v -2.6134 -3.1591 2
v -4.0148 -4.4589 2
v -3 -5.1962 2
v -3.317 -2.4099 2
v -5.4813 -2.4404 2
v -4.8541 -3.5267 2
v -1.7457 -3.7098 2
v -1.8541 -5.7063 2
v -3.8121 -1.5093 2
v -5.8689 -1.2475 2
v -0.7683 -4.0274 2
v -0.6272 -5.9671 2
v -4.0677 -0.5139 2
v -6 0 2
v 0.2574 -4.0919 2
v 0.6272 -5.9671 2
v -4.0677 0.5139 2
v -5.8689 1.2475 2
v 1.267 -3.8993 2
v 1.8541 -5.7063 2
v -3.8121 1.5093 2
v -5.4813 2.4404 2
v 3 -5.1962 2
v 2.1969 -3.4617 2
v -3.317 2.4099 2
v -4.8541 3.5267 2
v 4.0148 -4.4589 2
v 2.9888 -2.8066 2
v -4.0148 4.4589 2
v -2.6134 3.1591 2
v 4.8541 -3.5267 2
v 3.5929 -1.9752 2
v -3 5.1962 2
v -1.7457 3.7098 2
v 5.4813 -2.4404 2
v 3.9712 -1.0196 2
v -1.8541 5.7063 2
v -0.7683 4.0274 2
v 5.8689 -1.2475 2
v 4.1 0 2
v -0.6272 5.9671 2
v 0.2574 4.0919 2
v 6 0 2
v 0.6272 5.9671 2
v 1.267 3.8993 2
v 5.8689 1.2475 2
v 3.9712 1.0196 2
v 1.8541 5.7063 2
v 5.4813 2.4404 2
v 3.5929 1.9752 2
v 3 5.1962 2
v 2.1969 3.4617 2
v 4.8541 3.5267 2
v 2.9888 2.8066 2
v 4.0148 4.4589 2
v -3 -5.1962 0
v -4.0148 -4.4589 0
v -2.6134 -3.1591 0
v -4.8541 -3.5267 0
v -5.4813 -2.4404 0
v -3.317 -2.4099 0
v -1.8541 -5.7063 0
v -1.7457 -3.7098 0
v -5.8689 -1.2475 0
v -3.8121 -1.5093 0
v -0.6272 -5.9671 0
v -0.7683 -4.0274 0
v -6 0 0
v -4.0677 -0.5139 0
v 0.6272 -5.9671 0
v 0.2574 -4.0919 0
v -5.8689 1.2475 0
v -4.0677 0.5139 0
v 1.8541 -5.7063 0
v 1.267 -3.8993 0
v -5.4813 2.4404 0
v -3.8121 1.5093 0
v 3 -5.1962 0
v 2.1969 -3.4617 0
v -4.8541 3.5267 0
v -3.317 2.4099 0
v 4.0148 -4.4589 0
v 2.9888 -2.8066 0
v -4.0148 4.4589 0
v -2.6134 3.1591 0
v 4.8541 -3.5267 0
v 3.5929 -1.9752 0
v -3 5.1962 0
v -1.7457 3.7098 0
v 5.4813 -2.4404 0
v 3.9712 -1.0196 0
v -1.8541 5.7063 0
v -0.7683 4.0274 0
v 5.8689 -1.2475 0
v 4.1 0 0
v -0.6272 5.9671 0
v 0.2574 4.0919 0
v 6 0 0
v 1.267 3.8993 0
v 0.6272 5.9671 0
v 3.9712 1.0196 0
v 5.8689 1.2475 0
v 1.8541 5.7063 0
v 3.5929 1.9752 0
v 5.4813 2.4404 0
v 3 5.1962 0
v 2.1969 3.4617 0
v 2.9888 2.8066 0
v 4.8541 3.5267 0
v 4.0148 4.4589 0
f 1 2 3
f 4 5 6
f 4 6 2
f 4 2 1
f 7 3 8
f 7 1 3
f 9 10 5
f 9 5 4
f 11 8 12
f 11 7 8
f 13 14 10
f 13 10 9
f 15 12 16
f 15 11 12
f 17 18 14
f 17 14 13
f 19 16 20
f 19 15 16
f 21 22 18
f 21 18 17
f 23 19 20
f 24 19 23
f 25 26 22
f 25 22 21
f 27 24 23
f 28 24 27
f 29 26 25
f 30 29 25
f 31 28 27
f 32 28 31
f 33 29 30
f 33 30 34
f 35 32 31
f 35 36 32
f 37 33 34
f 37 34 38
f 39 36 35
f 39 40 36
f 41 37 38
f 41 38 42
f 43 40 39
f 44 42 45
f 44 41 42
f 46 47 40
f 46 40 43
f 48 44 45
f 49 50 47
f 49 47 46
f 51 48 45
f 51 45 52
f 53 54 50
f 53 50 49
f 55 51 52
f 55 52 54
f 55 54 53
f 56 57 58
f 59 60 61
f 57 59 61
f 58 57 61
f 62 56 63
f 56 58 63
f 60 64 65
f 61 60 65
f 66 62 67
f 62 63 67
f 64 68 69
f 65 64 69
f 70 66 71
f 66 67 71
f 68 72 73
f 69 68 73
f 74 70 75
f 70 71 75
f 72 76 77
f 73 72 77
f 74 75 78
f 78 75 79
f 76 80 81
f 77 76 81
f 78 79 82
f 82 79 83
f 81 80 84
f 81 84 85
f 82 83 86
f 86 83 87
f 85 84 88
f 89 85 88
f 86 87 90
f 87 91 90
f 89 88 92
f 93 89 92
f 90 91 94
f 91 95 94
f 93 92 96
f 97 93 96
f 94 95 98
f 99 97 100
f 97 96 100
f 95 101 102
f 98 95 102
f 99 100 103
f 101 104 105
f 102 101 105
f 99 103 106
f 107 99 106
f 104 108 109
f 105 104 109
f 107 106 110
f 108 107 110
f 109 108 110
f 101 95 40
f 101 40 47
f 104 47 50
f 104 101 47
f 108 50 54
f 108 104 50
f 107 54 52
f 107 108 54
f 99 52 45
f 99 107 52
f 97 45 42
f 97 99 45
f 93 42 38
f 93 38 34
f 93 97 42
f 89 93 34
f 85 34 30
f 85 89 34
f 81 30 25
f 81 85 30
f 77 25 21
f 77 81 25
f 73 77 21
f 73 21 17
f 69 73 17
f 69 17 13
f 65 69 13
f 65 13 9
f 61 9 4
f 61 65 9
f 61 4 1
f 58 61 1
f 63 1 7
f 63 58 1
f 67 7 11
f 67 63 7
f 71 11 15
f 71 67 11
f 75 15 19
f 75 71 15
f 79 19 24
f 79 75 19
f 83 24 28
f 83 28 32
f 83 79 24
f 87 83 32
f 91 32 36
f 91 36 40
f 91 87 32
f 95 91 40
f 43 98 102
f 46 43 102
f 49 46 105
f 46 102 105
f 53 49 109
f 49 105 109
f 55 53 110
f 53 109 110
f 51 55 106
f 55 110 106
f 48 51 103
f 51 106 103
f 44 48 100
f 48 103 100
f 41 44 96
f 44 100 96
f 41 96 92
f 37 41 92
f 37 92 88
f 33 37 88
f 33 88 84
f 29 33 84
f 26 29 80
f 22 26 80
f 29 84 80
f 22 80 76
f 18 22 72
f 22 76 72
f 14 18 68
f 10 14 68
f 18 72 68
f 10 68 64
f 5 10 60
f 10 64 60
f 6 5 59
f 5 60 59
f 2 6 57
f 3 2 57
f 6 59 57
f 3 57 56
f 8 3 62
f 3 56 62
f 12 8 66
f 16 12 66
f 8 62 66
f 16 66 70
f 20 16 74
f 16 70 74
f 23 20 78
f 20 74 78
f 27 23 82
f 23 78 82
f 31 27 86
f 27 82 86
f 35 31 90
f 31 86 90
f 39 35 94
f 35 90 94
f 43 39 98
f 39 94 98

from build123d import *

# Parameters (mm, degrees)
CYLINDER001_R     = 4.1
CYLINDER001_DEPTH = 2
CYLINDER_R        = 6
CYLINDER_DEPTH    = 2


with BuildPart() as inner:
    # Cylinder001 → Cylinder001 (new body)
    with BuildSketch(Plane.XY):
        Circle(CYLINDER001_R)
    extrude(amount=CYLINDER001_DEPTH)


with BuildPart() as cut:
    # Cylinder → Cylinder (new body)
    with BuildSketch(Plane.XY):
        Circle(CYLINDER_R)
    extrude(amount=CYLINDER_DEPTH)

    # Cut: cut Inner
    add(inner.part, mode=Mode.SUBTRACT)


solid = cut.part
